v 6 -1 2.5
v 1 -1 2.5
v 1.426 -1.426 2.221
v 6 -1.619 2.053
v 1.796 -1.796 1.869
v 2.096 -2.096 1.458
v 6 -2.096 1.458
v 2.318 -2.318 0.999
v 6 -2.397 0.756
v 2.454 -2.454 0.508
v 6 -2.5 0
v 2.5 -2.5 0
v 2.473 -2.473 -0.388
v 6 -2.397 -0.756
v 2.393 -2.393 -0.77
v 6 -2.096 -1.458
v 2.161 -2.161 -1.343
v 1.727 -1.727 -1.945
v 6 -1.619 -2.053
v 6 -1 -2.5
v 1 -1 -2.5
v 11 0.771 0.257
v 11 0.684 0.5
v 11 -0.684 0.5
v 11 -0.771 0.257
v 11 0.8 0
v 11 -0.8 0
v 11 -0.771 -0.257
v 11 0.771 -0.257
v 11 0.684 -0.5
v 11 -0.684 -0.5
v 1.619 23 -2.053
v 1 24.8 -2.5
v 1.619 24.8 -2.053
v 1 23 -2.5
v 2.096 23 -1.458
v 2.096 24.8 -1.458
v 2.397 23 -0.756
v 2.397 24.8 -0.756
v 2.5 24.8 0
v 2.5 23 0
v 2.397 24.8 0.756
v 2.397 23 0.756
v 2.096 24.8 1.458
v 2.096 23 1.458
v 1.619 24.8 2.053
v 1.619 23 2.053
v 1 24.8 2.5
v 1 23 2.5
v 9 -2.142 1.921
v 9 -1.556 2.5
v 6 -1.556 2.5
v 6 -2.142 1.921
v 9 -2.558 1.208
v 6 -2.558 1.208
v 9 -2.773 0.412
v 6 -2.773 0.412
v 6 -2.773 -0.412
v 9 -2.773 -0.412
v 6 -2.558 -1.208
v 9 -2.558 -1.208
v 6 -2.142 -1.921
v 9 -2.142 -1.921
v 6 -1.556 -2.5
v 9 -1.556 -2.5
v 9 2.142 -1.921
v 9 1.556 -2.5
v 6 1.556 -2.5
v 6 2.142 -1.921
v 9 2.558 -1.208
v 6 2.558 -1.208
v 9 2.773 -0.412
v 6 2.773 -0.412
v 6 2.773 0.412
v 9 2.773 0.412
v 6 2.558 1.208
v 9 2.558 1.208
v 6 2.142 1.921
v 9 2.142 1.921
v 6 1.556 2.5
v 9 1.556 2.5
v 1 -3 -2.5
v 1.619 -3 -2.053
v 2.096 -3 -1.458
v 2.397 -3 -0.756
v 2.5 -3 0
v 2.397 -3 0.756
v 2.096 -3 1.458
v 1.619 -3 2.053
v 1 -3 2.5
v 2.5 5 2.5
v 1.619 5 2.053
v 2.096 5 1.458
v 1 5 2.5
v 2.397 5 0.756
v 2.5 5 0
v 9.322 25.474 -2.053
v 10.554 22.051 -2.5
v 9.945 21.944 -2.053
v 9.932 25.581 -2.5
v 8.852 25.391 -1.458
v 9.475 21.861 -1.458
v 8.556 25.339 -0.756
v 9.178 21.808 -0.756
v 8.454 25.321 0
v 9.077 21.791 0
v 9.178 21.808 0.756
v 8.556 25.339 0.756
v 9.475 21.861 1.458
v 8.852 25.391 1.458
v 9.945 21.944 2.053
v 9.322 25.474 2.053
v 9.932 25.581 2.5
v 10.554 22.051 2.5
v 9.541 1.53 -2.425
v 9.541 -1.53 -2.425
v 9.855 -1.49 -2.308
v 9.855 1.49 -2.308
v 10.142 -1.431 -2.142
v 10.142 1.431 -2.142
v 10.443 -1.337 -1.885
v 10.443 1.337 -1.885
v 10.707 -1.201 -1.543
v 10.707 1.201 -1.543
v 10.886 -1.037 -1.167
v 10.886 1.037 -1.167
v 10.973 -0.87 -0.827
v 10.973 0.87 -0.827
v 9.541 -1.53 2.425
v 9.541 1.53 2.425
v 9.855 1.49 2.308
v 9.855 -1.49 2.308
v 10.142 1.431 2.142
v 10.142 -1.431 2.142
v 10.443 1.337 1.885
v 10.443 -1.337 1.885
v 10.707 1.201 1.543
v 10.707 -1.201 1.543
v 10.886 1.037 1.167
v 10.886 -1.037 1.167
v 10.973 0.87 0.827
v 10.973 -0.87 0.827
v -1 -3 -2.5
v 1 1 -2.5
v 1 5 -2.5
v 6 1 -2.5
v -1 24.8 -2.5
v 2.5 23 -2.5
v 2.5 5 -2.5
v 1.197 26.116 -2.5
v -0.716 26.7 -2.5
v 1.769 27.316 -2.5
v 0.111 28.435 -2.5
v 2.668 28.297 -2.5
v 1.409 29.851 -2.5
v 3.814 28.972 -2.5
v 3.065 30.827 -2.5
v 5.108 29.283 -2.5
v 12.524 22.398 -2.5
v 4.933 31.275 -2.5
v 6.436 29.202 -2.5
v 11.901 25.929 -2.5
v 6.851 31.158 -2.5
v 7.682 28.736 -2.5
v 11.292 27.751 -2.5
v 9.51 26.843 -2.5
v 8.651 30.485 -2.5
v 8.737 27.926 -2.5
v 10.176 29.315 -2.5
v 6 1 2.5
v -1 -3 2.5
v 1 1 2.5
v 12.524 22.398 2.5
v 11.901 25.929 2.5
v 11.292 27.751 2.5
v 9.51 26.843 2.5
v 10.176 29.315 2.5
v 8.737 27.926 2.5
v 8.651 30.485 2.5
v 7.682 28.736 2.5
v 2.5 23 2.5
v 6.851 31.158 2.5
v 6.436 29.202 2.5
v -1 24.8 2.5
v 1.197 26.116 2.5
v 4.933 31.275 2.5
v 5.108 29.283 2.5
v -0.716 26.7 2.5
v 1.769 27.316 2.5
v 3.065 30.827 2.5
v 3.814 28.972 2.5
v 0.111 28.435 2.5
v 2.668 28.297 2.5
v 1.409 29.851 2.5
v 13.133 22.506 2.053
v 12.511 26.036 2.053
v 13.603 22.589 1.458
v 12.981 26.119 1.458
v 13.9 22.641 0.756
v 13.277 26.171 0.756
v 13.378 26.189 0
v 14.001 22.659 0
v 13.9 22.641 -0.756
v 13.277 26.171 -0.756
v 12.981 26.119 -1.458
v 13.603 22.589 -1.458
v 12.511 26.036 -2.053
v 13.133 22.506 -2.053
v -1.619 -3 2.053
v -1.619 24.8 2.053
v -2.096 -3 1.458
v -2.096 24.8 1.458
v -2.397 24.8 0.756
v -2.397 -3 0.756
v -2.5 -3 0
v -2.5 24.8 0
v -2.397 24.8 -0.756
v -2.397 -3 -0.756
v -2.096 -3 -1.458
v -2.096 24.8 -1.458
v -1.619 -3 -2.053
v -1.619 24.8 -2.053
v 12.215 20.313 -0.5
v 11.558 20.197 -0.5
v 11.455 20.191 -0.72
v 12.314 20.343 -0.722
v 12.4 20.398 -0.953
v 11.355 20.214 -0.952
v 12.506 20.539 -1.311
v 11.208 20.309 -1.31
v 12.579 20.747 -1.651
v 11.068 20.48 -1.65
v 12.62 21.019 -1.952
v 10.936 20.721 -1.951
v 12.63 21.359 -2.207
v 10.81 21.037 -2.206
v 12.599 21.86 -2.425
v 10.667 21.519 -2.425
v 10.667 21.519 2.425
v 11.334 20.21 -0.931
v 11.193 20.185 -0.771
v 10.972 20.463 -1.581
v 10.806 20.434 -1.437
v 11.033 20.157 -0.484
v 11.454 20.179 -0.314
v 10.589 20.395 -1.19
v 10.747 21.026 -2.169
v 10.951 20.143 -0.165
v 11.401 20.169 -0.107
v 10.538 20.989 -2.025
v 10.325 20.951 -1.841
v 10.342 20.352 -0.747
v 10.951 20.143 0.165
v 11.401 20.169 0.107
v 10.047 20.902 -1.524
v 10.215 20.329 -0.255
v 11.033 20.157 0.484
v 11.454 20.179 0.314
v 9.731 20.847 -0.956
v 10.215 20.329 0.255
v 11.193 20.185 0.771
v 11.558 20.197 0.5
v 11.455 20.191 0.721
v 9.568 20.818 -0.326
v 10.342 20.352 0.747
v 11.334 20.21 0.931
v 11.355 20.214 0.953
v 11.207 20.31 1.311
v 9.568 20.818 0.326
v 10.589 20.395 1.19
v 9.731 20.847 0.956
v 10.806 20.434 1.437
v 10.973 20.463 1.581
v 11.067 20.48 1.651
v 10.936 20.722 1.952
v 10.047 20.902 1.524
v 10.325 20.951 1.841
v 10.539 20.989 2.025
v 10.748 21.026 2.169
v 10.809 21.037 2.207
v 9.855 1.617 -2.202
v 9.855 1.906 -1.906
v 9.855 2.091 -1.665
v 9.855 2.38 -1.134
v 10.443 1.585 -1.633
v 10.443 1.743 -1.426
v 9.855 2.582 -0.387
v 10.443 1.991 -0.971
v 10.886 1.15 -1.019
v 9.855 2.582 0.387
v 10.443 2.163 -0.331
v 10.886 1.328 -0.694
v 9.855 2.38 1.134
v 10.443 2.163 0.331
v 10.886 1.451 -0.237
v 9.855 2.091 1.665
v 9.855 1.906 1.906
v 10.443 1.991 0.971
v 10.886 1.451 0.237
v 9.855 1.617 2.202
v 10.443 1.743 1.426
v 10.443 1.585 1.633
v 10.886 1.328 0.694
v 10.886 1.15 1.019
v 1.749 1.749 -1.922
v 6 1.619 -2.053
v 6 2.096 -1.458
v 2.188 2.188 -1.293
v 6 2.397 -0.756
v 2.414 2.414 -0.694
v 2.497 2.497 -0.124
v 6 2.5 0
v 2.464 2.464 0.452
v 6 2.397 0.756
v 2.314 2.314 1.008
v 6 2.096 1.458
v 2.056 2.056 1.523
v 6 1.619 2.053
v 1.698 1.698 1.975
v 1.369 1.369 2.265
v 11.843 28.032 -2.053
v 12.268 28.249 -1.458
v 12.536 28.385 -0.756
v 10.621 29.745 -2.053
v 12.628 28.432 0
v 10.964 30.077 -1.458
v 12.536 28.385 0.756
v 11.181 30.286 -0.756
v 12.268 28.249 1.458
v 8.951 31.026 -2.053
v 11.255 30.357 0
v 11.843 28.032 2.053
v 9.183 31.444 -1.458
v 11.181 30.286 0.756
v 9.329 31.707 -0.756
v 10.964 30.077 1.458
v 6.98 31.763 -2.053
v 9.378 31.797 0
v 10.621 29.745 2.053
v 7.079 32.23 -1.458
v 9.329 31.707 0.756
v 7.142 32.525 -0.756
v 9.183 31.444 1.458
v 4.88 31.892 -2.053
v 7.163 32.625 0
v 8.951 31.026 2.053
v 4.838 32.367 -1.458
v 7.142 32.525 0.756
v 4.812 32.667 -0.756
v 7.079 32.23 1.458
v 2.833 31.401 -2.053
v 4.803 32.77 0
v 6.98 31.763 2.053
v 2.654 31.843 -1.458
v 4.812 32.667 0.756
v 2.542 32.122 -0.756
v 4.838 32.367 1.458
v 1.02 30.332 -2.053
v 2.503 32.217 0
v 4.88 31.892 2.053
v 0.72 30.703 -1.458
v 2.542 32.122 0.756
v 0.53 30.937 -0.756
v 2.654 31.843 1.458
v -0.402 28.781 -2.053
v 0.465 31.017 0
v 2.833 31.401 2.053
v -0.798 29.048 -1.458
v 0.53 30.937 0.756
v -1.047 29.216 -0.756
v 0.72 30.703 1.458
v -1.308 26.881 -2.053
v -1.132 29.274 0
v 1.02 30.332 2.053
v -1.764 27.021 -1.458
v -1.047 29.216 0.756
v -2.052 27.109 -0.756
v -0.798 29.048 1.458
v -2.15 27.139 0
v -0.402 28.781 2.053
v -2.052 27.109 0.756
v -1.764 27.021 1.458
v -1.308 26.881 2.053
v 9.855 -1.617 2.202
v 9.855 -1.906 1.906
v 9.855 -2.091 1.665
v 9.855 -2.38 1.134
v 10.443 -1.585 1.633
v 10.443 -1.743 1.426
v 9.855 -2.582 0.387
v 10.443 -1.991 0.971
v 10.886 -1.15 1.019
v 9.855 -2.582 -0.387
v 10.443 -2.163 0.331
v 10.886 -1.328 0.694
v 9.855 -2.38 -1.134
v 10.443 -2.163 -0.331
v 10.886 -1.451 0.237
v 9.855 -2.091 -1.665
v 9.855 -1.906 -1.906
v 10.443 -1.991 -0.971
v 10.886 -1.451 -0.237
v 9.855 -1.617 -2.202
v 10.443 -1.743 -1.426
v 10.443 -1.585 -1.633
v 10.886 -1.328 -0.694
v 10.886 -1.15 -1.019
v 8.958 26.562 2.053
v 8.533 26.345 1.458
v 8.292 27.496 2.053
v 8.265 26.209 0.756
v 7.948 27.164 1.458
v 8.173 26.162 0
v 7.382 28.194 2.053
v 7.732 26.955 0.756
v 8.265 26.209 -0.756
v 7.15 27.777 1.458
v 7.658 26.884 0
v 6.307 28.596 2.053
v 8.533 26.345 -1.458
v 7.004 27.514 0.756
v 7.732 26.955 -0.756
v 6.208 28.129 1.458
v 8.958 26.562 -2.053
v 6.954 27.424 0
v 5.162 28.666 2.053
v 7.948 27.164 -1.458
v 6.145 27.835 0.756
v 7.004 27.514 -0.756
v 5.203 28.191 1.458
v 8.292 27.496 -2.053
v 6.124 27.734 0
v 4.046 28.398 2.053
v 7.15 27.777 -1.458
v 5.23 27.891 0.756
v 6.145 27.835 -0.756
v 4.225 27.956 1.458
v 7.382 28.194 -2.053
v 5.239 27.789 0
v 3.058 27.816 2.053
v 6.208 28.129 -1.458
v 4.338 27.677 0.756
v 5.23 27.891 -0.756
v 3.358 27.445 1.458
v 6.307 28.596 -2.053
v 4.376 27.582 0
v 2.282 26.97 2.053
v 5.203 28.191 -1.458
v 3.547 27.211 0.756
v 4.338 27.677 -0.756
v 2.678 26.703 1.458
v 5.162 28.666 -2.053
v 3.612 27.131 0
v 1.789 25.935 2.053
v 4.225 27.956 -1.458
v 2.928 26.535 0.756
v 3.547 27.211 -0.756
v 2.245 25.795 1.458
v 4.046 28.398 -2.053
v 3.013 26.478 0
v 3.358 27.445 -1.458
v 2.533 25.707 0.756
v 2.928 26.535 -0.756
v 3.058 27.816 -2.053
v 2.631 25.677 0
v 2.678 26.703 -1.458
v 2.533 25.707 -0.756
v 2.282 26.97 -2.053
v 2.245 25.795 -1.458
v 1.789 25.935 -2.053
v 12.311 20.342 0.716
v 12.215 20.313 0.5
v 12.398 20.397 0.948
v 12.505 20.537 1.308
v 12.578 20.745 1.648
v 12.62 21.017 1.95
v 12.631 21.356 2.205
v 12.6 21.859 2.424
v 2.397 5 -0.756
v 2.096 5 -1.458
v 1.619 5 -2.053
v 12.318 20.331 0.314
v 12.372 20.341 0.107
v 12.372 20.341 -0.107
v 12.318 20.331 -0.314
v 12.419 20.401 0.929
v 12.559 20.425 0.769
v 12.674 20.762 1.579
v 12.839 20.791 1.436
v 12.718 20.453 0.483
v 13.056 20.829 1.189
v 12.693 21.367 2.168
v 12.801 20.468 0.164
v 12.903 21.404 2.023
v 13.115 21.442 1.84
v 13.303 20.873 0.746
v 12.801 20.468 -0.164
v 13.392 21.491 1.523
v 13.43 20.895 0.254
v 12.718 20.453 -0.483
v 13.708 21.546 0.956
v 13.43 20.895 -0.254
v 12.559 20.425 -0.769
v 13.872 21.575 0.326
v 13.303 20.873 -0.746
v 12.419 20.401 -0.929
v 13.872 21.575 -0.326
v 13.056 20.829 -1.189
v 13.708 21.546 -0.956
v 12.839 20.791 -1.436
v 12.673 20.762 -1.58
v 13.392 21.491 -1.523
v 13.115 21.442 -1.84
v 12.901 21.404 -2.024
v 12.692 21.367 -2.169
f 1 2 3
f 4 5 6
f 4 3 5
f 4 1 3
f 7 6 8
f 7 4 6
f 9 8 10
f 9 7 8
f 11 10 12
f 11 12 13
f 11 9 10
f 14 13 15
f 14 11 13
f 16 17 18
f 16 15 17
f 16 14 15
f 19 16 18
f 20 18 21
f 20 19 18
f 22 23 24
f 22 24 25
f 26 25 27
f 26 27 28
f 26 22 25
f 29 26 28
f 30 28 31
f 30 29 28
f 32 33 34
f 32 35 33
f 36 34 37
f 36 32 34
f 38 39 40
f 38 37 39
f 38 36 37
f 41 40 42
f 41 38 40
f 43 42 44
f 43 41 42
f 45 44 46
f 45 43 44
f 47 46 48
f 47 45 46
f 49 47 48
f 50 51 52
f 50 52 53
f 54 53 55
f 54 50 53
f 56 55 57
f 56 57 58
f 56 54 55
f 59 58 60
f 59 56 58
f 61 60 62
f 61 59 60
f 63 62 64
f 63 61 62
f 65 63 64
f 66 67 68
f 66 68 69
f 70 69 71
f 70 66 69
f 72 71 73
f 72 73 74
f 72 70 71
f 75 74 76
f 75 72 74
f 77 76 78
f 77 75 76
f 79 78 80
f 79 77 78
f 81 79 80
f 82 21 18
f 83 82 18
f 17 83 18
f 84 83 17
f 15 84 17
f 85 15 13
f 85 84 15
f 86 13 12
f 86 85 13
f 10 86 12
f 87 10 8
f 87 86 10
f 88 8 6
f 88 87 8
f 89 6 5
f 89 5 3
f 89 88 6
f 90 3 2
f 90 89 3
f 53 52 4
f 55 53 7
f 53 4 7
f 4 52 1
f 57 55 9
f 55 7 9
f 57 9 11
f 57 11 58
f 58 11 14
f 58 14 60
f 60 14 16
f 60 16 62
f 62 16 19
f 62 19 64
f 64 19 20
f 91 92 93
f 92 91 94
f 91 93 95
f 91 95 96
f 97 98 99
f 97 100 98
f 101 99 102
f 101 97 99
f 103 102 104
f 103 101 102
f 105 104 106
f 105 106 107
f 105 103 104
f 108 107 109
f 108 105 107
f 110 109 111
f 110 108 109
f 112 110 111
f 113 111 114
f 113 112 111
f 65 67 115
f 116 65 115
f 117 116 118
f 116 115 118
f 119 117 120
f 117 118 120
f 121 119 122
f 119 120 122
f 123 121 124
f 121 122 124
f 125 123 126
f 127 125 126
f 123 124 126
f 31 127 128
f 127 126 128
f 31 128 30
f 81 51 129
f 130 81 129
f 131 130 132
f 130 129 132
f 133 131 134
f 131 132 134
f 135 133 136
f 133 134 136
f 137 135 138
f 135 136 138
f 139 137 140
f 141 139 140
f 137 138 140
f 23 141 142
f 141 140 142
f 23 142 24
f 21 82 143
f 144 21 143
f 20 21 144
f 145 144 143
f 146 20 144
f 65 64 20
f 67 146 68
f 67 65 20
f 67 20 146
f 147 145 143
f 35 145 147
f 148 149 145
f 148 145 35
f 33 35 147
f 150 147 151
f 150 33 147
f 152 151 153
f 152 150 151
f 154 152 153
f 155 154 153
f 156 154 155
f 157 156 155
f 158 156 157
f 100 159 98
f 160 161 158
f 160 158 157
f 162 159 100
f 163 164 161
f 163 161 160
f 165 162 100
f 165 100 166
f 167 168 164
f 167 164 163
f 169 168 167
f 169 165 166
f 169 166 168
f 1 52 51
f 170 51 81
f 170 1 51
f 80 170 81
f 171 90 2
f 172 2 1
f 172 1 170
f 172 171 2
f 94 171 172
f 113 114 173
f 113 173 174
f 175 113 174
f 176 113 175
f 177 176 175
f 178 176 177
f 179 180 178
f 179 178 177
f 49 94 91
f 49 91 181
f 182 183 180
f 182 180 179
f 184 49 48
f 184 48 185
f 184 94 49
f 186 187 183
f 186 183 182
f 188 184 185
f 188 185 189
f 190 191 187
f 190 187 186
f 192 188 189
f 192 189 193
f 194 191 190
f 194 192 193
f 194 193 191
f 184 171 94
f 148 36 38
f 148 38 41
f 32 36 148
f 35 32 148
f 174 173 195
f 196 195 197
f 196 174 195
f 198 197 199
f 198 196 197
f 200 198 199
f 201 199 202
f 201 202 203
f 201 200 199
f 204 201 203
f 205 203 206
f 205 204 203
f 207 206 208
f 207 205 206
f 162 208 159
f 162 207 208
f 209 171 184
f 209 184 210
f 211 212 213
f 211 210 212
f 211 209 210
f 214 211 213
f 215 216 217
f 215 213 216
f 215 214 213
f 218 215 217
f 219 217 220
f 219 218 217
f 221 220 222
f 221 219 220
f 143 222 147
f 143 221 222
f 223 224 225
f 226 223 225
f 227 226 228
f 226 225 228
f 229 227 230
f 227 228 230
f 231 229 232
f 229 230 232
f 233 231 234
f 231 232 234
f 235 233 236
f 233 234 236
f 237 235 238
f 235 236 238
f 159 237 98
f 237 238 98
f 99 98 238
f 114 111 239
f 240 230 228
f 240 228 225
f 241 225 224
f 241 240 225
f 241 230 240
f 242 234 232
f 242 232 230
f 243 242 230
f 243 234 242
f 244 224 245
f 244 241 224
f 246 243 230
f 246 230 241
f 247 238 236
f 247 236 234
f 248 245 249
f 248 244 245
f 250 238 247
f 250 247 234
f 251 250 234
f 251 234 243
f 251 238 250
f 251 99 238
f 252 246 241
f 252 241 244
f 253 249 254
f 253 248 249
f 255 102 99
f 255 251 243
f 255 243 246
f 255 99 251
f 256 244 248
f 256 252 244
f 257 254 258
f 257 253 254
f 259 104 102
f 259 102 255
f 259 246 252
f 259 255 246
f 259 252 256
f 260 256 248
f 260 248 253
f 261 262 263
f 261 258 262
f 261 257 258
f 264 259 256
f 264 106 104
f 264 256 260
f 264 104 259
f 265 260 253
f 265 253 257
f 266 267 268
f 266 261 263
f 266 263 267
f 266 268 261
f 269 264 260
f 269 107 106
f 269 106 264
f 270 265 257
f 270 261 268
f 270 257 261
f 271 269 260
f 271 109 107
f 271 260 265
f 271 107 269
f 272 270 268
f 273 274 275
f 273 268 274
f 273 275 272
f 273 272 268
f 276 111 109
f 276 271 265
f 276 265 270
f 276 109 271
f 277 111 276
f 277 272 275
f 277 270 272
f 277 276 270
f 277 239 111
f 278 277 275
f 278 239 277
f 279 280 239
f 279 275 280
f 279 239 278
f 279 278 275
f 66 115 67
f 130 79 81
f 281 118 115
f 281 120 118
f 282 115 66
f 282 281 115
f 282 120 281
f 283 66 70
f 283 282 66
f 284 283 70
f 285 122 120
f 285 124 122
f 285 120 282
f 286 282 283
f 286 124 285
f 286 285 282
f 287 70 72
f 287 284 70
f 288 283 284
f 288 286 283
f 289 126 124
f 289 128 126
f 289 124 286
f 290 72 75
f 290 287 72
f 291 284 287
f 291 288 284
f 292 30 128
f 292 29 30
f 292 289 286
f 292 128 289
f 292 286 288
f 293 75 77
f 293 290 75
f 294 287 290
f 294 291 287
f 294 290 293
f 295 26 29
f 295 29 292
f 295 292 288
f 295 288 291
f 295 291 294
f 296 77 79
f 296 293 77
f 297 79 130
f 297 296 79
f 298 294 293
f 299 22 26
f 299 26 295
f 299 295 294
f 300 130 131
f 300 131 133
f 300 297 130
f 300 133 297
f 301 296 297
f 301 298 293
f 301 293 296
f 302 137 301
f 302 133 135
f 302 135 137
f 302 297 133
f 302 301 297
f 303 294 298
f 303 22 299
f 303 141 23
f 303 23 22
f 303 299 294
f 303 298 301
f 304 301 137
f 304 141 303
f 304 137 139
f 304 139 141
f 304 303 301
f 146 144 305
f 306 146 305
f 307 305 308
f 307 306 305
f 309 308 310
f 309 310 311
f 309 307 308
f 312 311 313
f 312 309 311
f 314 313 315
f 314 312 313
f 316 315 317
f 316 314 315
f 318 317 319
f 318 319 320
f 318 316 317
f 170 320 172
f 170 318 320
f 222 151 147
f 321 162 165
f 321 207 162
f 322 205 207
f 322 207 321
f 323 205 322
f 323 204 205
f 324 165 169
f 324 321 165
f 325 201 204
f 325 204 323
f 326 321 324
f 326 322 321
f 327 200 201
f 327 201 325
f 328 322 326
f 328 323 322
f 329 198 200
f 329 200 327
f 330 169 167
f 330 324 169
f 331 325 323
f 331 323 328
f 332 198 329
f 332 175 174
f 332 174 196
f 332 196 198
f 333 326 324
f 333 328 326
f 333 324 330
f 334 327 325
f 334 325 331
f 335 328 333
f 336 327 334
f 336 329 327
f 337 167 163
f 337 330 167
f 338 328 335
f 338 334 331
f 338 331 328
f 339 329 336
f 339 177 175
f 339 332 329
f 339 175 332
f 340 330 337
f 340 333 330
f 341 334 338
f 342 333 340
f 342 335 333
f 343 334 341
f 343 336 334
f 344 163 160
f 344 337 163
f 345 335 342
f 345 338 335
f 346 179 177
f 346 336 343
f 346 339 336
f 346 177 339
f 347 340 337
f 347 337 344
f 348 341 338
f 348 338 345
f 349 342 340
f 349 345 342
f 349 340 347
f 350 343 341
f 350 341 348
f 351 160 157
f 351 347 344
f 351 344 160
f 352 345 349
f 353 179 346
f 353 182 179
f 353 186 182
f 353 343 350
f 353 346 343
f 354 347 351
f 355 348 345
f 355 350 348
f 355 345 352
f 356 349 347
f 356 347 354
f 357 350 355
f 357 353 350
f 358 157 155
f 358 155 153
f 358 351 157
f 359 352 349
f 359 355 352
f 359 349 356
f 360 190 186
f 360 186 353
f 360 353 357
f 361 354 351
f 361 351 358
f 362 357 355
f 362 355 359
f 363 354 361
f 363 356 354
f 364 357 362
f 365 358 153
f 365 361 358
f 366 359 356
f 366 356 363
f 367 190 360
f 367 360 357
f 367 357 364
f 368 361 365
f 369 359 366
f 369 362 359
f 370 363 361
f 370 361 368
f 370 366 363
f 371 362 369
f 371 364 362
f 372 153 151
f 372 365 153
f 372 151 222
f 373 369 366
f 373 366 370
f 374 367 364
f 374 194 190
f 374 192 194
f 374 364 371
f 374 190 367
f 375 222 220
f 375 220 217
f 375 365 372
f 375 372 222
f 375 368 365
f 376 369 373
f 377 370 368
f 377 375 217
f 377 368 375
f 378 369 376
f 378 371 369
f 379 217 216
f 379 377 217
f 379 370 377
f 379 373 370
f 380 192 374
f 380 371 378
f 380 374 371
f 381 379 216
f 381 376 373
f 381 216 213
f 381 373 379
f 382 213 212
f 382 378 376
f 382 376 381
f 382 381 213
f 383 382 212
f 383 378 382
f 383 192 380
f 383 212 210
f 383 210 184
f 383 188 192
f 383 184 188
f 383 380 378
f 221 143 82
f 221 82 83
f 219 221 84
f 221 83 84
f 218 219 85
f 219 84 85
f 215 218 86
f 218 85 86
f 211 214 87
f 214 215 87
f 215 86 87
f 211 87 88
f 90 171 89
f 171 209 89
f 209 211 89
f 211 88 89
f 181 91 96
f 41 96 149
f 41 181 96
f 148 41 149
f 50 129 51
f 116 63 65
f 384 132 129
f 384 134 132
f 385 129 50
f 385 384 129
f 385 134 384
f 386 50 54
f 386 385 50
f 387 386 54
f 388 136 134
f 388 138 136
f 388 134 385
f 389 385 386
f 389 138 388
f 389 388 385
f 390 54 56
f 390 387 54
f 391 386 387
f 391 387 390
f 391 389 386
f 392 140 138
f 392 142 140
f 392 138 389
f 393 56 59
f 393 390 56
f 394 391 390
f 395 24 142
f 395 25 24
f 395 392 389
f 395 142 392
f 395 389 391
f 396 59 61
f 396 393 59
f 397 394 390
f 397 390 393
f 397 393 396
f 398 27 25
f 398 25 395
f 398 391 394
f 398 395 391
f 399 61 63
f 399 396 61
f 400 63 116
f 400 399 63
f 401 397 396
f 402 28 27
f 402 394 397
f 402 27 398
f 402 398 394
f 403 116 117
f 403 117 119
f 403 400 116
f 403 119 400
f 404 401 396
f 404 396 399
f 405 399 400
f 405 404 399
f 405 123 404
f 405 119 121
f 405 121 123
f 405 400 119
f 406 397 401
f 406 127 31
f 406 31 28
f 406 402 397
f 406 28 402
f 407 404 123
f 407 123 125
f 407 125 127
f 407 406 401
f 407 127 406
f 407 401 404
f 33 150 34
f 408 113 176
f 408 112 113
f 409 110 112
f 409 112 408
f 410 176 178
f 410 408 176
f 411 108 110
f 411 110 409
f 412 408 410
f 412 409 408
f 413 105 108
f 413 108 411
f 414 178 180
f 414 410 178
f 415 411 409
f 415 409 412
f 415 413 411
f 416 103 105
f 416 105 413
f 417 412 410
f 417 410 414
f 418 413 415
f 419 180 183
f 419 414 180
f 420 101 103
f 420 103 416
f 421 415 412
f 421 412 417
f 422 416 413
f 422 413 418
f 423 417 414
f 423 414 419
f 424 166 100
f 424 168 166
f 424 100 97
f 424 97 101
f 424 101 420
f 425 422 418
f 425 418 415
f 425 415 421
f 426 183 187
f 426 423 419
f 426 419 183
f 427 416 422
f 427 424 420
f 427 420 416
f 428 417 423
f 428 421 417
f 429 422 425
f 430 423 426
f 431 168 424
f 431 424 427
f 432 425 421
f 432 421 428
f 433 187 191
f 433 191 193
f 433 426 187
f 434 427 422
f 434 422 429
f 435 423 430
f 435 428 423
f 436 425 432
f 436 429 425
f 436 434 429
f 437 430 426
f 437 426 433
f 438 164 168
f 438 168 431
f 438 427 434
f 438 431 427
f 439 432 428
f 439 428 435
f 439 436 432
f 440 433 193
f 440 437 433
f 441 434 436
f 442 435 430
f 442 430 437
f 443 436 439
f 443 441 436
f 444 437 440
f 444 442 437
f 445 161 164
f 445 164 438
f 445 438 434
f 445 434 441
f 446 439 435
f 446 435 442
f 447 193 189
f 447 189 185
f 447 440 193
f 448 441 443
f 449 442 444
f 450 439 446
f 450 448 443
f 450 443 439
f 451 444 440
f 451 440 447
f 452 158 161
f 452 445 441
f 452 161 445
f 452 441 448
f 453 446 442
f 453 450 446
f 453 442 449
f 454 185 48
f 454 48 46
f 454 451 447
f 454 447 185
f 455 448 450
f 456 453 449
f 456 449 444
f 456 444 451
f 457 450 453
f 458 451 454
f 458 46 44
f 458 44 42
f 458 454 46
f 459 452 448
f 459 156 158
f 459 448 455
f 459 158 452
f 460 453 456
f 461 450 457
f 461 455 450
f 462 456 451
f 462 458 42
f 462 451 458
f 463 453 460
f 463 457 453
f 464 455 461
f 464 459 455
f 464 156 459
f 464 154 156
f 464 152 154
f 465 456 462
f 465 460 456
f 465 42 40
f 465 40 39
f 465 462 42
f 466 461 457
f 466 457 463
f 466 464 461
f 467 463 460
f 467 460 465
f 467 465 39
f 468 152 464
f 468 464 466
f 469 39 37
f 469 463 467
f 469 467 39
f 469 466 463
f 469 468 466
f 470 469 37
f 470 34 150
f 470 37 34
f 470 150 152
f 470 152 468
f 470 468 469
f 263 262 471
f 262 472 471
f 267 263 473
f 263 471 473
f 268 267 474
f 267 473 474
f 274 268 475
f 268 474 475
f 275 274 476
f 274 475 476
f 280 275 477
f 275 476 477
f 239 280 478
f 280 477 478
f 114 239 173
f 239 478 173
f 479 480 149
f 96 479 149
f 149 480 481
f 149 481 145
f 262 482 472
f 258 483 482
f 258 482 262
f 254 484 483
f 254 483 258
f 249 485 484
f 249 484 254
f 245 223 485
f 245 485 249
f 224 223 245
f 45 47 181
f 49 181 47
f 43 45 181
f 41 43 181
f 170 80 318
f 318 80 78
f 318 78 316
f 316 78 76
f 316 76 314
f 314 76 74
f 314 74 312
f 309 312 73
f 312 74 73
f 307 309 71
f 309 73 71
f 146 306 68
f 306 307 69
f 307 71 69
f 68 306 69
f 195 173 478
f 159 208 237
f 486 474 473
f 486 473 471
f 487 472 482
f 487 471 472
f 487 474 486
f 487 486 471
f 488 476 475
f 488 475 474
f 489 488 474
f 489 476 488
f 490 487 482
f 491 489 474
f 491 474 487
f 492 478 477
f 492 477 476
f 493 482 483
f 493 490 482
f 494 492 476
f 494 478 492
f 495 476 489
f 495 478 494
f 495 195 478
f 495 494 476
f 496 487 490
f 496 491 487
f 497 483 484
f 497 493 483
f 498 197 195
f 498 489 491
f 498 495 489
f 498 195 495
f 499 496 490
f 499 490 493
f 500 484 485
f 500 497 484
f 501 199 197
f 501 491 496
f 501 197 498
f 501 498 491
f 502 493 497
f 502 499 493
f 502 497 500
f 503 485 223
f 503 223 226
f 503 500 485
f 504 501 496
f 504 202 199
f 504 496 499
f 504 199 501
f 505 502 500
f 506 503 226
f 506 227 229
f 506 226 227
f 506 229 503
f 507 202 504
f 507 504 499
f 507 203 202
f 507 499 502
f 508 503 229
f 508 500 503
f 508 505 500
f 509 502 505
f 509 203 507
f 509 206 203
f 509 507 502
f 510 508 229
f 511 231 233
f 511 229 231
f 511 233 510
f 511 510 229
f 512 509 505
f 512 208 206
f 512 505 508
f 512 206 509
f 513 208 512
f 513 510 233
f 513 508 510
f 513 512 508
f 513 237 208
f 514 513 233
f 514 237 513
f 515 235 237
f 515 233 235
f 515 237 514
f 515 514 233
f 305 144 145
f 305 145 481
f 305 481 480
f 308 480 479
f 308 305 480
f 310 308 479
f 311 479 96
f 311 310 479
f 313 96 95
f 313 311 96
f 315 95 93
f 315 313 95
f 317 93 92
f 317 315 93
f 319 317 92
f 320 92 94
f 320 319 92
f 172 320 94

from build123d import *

# Parameters (mm, degrees)
EXTRUDE_1_DEPTH = 5
SKETCH_19_W     = 5
SKETCH_19_H     = 18
EXTRUDE_2_DEPTH = 1.5
FILLET_2_R      = 2


with BuildPart() as part:
    # 扫描2: sweep along a path in 草图1
    with BuildLine(Plane.XY) as sweep_2_path:
        Line((11.886241035, 20.255064977), (10.916442642, 25.755064977))
        ThreePointArc((10.916442642, 25.755064977), (5.020643415, 30.27907084), (0, 24.8))
        Line((0, 24.8), (0, 0))
        Line((0, 0), (0, -3))
    # 草图13 → 扫描2 (sweep)
    with BuildSketch(Plane(origin=(0, -3, 0), x_dir=(1, 0, 0), z_dir=(0, 1, 0))):
        with BuildLine():
            Line((-1, -2.5), (1, -2.5))
            ThreePointArc((1, -2.5), (2.5, 0), (1, 2.5))
            Line((1, 2.5), (-1, 2.5))
            ThreePointArc((-1, 2.5), (-2.5, 0), (-1, -2.5))
        make_face()
    sweep(path=sweep_2_path.line)

    # 扫描4: sweep along a path in 草图15
    with BuildLine(Plane.XY) as sweep_4_path:
        Line((0, 0), (11, 0))
    # 草图16 → 扫描4 (sweep)
    with BuildSketch(Plane(origin=(11, 0, 0), x_dir=(0, 0, -1), z_dir=(1, 0, 0))):
        with BuildLine():
            Line((-2.5, -1), (-2.5, 1))
            ThreePointArc((-2.5, 1), (0, 2.5), (2.5, 1))
            Line((2.5, 1), (2.5, -1))
            ThreePointArc((2.5, -1), (0, -2.5), (-2.5, -1))
        make_face()
    sweep(path=sweep_4_path.line)

    # 草图17 → 凸台-拉伸1 (add)
    with BuildSketch(Plane(origin=(11, 0, 0), x_dir=(0, 0, -1), z_dir=(1, 0, 0))):
        with BuildLine():
            Line((-2.5, 1.555522876), (-2.5, -1.555522876))
            ThreePointArc((-2.5, -1.555522876), (0, -2.8), (2.5, -1.555522876))
            Line((2.5, -1.555522876), (2.5, 1.555522876))
            ThreePointArc((2.5, 1.555522876), (0, 2.8), (-2.5, 1.555522876))
        make_face()
    extrude(amount=-EXTRUDE_1_DEPTH)

    # 草图19 → 凸台-拉伸2 (add)
    with BuildSketch(Plane(origin=(1, 0, 0), x_dir=(0, 0, -1), z_dir=(1, 0, 0))):
        with Locations((0, 14)):
            Rectangle(SKETCH_19_W, SKETCH_19_H)
    extrude(amount=EXTRUDE_2_DEPTH)

    # 圆角2
    # the kernel refuses this fillet: 2 mm, written as the material it takes off along each edge
    with BuildSketch(Plane(origin=(17.795087554, 21.296954043, 2.5), x_dir=(0, 0, -1), z_dir=(-0.9848077530122092, -0.17364817766692373, 0))) as fillet_2_piece_1:
        with BuildLine():
            CenterArc((FILLET_2_R, -FILLET_2_R), FILLET_2_R, 90, 90)
            Line((0, -FILLET_2_R), (0, 0))
            Line((0, 0), (FILLET_2_R, 0))
        make_face()
    extrude(amount=12, mode=Mode.SUBTRACT)
    with BuildSketch(Plane(origin=(12.214510286, 20.312947703, 0), x_dir=(0.9423506208781959, 0.16616183974819204, -0.29045748456869663), z_dir=(0.2860447827236766, 0.05043741288507259, 0.9568878981667733))) as fillet_2_piece_2:
        with BuildLine():
            CenterArc((2.833333333 - FILLET_2_R, FILLET_2_R), FILLET_2_R, 270, 90)
            Line((2.833333333 - FILLET_2_R, 0), (2.833333333, 0))
            Line((2.833333333, 0), (2.833333333, FILLET_2_R))
        make_face()
    revolve(axis=Axis((12.214510286, 20.312947703, 0), (-0.173648177666923, 0.9848077530122094, 0)), revolution_arc=326.229306127, mode=Mode.SUBTRACT)
    with BuildSketch(Plane(origin=(5.977394517, 19.213175911, -2.5), x_dir=(-0.17364817766692373, 0.9848077530122092, 0), z_dir=(0.9848077530122092, 0.17364817766692373, 0))) as fillet_2_piece_3:
        with BuildLine():
            CenterArc((FILLET_2_R, FILLET_2_R), FILLET_2_R, 180, 90)
            Line((0, FILLET_2_R), (0, 0))
            Line((0, 0), (FILLET_2_R, 0))
        make_face()
    extrude(amount=12, mode=Mode.SUBTRACT)
    with BuildSketch(Plane(origin=(11, -6.555522876, 2.5), x_dir=(0, 0, -1), z_dir=(0, 1, 0))) as fillet_2_piece_4:
        with BuildLine():
            CenterArc((FILLET_2_R, FILLET_2_R), FILLET_2_R, 180, 90)
            Line((0, FILLET_2_R), (0, 0))
            Line((0, 0), (FILLET_2_R, 0))
        make_face()
    extrude(amount=13.111045751, mode=Mode.SUBTRACT)
    with BuildSketch(Plane(origin=(11, 6.555522876, -2.5), x_dir=(-1, 0, 0), z_dir=(0, -1, 0))) as fillet_2_piece_5:
        with BuildLine():
            CenterArc((FILLET_2_R, -FILLET_2_R), FILLET_2_R, 90, 90)
            Line((0, -FILLET_2_R), (0, 0))
            Line((0, 0), (FILLET_2_R, 0))
        make_face()
    extrude(amount=13.111045751, mode=Mode.SUBTRACT)
    with BuildSketch(Plane(origin=(11, -0.333333333, 0), x_dir=(0, -0.8131785022115455, -0.582014367125922), z_dir=(0, -0.582014367125922, 0.8131785022115455))) as fillet_2_piece_6:
        with BuildLine():
            CenterArc((3.133333333 - FILLET_2_R, -FILLET_2_R), FILLET_2_R, 0, 90)
            Line((3.133333333, -FILLET_2_R), (3.133333333, 0))
            Line((3.133333333, 0), (3.133333333 - FILLET_2_R, 0))
        make_face()
    revolve(axis=Axis((11, -0.333333333, 0), (1, 0, 0)), revolution_arc=288.815304863, mode=Mode.SUBTRACT)
    with BuildSketch(Plane(origin=(11, 0.333333333, 0), x_dir=(0, 0.8131785022115376, 0.5820143671259329), z_dir=(0, 0.5820143671259329, -0.8131785022115376))) as fillet_2_piece_7:
        with BuildLine():
            CenterArc((3.133333333 - FILLET_2_R, -FILLET_2_R), FILLET_2_R, 0, 90)
            Line((3.133333333 - FILLET_2_R, 0), (3.133333333, 0))
            Line((3.133333333, 0), (3.133333333, -FILLET_2_R))
        make_face()
    revolve(axis=Axis((11, 0.333333333, 0), (1, 0, 0)), revolution_arc=288.815304863, mode=Mode.SUBTRACT)
    with BuildSketch(Plane(origin=(11.557971784, 20.197182251, 0), x_dir=(-0.9423506208781961, -0.16616183974819207, 0.2904574845686964), z_dir=(-0.2860447827236764, -0.05043741288507257, -0.9568878981667737))) as fillet_2_piece_8:
        with BuildLine():
            CenterArc((2.833333333 - FILLET_2_R, FILLET_2_R), FILLET_2_R, 270, 90)
            Line((2.833333333, FILLET_2_R), (2.833333333, 0))
            Line((2.833333333, 0), (2.833333333 - FILLET_2_R, 0))
        make_face()
    revolve(axis=Axis((11.557971784, 20.197182251, 0), (-0.17364817766692306, 0.9848077530122095, 0)), revolution_arc=326.229306127, mode=Mode.SUBTRACT)


solid = part.part
